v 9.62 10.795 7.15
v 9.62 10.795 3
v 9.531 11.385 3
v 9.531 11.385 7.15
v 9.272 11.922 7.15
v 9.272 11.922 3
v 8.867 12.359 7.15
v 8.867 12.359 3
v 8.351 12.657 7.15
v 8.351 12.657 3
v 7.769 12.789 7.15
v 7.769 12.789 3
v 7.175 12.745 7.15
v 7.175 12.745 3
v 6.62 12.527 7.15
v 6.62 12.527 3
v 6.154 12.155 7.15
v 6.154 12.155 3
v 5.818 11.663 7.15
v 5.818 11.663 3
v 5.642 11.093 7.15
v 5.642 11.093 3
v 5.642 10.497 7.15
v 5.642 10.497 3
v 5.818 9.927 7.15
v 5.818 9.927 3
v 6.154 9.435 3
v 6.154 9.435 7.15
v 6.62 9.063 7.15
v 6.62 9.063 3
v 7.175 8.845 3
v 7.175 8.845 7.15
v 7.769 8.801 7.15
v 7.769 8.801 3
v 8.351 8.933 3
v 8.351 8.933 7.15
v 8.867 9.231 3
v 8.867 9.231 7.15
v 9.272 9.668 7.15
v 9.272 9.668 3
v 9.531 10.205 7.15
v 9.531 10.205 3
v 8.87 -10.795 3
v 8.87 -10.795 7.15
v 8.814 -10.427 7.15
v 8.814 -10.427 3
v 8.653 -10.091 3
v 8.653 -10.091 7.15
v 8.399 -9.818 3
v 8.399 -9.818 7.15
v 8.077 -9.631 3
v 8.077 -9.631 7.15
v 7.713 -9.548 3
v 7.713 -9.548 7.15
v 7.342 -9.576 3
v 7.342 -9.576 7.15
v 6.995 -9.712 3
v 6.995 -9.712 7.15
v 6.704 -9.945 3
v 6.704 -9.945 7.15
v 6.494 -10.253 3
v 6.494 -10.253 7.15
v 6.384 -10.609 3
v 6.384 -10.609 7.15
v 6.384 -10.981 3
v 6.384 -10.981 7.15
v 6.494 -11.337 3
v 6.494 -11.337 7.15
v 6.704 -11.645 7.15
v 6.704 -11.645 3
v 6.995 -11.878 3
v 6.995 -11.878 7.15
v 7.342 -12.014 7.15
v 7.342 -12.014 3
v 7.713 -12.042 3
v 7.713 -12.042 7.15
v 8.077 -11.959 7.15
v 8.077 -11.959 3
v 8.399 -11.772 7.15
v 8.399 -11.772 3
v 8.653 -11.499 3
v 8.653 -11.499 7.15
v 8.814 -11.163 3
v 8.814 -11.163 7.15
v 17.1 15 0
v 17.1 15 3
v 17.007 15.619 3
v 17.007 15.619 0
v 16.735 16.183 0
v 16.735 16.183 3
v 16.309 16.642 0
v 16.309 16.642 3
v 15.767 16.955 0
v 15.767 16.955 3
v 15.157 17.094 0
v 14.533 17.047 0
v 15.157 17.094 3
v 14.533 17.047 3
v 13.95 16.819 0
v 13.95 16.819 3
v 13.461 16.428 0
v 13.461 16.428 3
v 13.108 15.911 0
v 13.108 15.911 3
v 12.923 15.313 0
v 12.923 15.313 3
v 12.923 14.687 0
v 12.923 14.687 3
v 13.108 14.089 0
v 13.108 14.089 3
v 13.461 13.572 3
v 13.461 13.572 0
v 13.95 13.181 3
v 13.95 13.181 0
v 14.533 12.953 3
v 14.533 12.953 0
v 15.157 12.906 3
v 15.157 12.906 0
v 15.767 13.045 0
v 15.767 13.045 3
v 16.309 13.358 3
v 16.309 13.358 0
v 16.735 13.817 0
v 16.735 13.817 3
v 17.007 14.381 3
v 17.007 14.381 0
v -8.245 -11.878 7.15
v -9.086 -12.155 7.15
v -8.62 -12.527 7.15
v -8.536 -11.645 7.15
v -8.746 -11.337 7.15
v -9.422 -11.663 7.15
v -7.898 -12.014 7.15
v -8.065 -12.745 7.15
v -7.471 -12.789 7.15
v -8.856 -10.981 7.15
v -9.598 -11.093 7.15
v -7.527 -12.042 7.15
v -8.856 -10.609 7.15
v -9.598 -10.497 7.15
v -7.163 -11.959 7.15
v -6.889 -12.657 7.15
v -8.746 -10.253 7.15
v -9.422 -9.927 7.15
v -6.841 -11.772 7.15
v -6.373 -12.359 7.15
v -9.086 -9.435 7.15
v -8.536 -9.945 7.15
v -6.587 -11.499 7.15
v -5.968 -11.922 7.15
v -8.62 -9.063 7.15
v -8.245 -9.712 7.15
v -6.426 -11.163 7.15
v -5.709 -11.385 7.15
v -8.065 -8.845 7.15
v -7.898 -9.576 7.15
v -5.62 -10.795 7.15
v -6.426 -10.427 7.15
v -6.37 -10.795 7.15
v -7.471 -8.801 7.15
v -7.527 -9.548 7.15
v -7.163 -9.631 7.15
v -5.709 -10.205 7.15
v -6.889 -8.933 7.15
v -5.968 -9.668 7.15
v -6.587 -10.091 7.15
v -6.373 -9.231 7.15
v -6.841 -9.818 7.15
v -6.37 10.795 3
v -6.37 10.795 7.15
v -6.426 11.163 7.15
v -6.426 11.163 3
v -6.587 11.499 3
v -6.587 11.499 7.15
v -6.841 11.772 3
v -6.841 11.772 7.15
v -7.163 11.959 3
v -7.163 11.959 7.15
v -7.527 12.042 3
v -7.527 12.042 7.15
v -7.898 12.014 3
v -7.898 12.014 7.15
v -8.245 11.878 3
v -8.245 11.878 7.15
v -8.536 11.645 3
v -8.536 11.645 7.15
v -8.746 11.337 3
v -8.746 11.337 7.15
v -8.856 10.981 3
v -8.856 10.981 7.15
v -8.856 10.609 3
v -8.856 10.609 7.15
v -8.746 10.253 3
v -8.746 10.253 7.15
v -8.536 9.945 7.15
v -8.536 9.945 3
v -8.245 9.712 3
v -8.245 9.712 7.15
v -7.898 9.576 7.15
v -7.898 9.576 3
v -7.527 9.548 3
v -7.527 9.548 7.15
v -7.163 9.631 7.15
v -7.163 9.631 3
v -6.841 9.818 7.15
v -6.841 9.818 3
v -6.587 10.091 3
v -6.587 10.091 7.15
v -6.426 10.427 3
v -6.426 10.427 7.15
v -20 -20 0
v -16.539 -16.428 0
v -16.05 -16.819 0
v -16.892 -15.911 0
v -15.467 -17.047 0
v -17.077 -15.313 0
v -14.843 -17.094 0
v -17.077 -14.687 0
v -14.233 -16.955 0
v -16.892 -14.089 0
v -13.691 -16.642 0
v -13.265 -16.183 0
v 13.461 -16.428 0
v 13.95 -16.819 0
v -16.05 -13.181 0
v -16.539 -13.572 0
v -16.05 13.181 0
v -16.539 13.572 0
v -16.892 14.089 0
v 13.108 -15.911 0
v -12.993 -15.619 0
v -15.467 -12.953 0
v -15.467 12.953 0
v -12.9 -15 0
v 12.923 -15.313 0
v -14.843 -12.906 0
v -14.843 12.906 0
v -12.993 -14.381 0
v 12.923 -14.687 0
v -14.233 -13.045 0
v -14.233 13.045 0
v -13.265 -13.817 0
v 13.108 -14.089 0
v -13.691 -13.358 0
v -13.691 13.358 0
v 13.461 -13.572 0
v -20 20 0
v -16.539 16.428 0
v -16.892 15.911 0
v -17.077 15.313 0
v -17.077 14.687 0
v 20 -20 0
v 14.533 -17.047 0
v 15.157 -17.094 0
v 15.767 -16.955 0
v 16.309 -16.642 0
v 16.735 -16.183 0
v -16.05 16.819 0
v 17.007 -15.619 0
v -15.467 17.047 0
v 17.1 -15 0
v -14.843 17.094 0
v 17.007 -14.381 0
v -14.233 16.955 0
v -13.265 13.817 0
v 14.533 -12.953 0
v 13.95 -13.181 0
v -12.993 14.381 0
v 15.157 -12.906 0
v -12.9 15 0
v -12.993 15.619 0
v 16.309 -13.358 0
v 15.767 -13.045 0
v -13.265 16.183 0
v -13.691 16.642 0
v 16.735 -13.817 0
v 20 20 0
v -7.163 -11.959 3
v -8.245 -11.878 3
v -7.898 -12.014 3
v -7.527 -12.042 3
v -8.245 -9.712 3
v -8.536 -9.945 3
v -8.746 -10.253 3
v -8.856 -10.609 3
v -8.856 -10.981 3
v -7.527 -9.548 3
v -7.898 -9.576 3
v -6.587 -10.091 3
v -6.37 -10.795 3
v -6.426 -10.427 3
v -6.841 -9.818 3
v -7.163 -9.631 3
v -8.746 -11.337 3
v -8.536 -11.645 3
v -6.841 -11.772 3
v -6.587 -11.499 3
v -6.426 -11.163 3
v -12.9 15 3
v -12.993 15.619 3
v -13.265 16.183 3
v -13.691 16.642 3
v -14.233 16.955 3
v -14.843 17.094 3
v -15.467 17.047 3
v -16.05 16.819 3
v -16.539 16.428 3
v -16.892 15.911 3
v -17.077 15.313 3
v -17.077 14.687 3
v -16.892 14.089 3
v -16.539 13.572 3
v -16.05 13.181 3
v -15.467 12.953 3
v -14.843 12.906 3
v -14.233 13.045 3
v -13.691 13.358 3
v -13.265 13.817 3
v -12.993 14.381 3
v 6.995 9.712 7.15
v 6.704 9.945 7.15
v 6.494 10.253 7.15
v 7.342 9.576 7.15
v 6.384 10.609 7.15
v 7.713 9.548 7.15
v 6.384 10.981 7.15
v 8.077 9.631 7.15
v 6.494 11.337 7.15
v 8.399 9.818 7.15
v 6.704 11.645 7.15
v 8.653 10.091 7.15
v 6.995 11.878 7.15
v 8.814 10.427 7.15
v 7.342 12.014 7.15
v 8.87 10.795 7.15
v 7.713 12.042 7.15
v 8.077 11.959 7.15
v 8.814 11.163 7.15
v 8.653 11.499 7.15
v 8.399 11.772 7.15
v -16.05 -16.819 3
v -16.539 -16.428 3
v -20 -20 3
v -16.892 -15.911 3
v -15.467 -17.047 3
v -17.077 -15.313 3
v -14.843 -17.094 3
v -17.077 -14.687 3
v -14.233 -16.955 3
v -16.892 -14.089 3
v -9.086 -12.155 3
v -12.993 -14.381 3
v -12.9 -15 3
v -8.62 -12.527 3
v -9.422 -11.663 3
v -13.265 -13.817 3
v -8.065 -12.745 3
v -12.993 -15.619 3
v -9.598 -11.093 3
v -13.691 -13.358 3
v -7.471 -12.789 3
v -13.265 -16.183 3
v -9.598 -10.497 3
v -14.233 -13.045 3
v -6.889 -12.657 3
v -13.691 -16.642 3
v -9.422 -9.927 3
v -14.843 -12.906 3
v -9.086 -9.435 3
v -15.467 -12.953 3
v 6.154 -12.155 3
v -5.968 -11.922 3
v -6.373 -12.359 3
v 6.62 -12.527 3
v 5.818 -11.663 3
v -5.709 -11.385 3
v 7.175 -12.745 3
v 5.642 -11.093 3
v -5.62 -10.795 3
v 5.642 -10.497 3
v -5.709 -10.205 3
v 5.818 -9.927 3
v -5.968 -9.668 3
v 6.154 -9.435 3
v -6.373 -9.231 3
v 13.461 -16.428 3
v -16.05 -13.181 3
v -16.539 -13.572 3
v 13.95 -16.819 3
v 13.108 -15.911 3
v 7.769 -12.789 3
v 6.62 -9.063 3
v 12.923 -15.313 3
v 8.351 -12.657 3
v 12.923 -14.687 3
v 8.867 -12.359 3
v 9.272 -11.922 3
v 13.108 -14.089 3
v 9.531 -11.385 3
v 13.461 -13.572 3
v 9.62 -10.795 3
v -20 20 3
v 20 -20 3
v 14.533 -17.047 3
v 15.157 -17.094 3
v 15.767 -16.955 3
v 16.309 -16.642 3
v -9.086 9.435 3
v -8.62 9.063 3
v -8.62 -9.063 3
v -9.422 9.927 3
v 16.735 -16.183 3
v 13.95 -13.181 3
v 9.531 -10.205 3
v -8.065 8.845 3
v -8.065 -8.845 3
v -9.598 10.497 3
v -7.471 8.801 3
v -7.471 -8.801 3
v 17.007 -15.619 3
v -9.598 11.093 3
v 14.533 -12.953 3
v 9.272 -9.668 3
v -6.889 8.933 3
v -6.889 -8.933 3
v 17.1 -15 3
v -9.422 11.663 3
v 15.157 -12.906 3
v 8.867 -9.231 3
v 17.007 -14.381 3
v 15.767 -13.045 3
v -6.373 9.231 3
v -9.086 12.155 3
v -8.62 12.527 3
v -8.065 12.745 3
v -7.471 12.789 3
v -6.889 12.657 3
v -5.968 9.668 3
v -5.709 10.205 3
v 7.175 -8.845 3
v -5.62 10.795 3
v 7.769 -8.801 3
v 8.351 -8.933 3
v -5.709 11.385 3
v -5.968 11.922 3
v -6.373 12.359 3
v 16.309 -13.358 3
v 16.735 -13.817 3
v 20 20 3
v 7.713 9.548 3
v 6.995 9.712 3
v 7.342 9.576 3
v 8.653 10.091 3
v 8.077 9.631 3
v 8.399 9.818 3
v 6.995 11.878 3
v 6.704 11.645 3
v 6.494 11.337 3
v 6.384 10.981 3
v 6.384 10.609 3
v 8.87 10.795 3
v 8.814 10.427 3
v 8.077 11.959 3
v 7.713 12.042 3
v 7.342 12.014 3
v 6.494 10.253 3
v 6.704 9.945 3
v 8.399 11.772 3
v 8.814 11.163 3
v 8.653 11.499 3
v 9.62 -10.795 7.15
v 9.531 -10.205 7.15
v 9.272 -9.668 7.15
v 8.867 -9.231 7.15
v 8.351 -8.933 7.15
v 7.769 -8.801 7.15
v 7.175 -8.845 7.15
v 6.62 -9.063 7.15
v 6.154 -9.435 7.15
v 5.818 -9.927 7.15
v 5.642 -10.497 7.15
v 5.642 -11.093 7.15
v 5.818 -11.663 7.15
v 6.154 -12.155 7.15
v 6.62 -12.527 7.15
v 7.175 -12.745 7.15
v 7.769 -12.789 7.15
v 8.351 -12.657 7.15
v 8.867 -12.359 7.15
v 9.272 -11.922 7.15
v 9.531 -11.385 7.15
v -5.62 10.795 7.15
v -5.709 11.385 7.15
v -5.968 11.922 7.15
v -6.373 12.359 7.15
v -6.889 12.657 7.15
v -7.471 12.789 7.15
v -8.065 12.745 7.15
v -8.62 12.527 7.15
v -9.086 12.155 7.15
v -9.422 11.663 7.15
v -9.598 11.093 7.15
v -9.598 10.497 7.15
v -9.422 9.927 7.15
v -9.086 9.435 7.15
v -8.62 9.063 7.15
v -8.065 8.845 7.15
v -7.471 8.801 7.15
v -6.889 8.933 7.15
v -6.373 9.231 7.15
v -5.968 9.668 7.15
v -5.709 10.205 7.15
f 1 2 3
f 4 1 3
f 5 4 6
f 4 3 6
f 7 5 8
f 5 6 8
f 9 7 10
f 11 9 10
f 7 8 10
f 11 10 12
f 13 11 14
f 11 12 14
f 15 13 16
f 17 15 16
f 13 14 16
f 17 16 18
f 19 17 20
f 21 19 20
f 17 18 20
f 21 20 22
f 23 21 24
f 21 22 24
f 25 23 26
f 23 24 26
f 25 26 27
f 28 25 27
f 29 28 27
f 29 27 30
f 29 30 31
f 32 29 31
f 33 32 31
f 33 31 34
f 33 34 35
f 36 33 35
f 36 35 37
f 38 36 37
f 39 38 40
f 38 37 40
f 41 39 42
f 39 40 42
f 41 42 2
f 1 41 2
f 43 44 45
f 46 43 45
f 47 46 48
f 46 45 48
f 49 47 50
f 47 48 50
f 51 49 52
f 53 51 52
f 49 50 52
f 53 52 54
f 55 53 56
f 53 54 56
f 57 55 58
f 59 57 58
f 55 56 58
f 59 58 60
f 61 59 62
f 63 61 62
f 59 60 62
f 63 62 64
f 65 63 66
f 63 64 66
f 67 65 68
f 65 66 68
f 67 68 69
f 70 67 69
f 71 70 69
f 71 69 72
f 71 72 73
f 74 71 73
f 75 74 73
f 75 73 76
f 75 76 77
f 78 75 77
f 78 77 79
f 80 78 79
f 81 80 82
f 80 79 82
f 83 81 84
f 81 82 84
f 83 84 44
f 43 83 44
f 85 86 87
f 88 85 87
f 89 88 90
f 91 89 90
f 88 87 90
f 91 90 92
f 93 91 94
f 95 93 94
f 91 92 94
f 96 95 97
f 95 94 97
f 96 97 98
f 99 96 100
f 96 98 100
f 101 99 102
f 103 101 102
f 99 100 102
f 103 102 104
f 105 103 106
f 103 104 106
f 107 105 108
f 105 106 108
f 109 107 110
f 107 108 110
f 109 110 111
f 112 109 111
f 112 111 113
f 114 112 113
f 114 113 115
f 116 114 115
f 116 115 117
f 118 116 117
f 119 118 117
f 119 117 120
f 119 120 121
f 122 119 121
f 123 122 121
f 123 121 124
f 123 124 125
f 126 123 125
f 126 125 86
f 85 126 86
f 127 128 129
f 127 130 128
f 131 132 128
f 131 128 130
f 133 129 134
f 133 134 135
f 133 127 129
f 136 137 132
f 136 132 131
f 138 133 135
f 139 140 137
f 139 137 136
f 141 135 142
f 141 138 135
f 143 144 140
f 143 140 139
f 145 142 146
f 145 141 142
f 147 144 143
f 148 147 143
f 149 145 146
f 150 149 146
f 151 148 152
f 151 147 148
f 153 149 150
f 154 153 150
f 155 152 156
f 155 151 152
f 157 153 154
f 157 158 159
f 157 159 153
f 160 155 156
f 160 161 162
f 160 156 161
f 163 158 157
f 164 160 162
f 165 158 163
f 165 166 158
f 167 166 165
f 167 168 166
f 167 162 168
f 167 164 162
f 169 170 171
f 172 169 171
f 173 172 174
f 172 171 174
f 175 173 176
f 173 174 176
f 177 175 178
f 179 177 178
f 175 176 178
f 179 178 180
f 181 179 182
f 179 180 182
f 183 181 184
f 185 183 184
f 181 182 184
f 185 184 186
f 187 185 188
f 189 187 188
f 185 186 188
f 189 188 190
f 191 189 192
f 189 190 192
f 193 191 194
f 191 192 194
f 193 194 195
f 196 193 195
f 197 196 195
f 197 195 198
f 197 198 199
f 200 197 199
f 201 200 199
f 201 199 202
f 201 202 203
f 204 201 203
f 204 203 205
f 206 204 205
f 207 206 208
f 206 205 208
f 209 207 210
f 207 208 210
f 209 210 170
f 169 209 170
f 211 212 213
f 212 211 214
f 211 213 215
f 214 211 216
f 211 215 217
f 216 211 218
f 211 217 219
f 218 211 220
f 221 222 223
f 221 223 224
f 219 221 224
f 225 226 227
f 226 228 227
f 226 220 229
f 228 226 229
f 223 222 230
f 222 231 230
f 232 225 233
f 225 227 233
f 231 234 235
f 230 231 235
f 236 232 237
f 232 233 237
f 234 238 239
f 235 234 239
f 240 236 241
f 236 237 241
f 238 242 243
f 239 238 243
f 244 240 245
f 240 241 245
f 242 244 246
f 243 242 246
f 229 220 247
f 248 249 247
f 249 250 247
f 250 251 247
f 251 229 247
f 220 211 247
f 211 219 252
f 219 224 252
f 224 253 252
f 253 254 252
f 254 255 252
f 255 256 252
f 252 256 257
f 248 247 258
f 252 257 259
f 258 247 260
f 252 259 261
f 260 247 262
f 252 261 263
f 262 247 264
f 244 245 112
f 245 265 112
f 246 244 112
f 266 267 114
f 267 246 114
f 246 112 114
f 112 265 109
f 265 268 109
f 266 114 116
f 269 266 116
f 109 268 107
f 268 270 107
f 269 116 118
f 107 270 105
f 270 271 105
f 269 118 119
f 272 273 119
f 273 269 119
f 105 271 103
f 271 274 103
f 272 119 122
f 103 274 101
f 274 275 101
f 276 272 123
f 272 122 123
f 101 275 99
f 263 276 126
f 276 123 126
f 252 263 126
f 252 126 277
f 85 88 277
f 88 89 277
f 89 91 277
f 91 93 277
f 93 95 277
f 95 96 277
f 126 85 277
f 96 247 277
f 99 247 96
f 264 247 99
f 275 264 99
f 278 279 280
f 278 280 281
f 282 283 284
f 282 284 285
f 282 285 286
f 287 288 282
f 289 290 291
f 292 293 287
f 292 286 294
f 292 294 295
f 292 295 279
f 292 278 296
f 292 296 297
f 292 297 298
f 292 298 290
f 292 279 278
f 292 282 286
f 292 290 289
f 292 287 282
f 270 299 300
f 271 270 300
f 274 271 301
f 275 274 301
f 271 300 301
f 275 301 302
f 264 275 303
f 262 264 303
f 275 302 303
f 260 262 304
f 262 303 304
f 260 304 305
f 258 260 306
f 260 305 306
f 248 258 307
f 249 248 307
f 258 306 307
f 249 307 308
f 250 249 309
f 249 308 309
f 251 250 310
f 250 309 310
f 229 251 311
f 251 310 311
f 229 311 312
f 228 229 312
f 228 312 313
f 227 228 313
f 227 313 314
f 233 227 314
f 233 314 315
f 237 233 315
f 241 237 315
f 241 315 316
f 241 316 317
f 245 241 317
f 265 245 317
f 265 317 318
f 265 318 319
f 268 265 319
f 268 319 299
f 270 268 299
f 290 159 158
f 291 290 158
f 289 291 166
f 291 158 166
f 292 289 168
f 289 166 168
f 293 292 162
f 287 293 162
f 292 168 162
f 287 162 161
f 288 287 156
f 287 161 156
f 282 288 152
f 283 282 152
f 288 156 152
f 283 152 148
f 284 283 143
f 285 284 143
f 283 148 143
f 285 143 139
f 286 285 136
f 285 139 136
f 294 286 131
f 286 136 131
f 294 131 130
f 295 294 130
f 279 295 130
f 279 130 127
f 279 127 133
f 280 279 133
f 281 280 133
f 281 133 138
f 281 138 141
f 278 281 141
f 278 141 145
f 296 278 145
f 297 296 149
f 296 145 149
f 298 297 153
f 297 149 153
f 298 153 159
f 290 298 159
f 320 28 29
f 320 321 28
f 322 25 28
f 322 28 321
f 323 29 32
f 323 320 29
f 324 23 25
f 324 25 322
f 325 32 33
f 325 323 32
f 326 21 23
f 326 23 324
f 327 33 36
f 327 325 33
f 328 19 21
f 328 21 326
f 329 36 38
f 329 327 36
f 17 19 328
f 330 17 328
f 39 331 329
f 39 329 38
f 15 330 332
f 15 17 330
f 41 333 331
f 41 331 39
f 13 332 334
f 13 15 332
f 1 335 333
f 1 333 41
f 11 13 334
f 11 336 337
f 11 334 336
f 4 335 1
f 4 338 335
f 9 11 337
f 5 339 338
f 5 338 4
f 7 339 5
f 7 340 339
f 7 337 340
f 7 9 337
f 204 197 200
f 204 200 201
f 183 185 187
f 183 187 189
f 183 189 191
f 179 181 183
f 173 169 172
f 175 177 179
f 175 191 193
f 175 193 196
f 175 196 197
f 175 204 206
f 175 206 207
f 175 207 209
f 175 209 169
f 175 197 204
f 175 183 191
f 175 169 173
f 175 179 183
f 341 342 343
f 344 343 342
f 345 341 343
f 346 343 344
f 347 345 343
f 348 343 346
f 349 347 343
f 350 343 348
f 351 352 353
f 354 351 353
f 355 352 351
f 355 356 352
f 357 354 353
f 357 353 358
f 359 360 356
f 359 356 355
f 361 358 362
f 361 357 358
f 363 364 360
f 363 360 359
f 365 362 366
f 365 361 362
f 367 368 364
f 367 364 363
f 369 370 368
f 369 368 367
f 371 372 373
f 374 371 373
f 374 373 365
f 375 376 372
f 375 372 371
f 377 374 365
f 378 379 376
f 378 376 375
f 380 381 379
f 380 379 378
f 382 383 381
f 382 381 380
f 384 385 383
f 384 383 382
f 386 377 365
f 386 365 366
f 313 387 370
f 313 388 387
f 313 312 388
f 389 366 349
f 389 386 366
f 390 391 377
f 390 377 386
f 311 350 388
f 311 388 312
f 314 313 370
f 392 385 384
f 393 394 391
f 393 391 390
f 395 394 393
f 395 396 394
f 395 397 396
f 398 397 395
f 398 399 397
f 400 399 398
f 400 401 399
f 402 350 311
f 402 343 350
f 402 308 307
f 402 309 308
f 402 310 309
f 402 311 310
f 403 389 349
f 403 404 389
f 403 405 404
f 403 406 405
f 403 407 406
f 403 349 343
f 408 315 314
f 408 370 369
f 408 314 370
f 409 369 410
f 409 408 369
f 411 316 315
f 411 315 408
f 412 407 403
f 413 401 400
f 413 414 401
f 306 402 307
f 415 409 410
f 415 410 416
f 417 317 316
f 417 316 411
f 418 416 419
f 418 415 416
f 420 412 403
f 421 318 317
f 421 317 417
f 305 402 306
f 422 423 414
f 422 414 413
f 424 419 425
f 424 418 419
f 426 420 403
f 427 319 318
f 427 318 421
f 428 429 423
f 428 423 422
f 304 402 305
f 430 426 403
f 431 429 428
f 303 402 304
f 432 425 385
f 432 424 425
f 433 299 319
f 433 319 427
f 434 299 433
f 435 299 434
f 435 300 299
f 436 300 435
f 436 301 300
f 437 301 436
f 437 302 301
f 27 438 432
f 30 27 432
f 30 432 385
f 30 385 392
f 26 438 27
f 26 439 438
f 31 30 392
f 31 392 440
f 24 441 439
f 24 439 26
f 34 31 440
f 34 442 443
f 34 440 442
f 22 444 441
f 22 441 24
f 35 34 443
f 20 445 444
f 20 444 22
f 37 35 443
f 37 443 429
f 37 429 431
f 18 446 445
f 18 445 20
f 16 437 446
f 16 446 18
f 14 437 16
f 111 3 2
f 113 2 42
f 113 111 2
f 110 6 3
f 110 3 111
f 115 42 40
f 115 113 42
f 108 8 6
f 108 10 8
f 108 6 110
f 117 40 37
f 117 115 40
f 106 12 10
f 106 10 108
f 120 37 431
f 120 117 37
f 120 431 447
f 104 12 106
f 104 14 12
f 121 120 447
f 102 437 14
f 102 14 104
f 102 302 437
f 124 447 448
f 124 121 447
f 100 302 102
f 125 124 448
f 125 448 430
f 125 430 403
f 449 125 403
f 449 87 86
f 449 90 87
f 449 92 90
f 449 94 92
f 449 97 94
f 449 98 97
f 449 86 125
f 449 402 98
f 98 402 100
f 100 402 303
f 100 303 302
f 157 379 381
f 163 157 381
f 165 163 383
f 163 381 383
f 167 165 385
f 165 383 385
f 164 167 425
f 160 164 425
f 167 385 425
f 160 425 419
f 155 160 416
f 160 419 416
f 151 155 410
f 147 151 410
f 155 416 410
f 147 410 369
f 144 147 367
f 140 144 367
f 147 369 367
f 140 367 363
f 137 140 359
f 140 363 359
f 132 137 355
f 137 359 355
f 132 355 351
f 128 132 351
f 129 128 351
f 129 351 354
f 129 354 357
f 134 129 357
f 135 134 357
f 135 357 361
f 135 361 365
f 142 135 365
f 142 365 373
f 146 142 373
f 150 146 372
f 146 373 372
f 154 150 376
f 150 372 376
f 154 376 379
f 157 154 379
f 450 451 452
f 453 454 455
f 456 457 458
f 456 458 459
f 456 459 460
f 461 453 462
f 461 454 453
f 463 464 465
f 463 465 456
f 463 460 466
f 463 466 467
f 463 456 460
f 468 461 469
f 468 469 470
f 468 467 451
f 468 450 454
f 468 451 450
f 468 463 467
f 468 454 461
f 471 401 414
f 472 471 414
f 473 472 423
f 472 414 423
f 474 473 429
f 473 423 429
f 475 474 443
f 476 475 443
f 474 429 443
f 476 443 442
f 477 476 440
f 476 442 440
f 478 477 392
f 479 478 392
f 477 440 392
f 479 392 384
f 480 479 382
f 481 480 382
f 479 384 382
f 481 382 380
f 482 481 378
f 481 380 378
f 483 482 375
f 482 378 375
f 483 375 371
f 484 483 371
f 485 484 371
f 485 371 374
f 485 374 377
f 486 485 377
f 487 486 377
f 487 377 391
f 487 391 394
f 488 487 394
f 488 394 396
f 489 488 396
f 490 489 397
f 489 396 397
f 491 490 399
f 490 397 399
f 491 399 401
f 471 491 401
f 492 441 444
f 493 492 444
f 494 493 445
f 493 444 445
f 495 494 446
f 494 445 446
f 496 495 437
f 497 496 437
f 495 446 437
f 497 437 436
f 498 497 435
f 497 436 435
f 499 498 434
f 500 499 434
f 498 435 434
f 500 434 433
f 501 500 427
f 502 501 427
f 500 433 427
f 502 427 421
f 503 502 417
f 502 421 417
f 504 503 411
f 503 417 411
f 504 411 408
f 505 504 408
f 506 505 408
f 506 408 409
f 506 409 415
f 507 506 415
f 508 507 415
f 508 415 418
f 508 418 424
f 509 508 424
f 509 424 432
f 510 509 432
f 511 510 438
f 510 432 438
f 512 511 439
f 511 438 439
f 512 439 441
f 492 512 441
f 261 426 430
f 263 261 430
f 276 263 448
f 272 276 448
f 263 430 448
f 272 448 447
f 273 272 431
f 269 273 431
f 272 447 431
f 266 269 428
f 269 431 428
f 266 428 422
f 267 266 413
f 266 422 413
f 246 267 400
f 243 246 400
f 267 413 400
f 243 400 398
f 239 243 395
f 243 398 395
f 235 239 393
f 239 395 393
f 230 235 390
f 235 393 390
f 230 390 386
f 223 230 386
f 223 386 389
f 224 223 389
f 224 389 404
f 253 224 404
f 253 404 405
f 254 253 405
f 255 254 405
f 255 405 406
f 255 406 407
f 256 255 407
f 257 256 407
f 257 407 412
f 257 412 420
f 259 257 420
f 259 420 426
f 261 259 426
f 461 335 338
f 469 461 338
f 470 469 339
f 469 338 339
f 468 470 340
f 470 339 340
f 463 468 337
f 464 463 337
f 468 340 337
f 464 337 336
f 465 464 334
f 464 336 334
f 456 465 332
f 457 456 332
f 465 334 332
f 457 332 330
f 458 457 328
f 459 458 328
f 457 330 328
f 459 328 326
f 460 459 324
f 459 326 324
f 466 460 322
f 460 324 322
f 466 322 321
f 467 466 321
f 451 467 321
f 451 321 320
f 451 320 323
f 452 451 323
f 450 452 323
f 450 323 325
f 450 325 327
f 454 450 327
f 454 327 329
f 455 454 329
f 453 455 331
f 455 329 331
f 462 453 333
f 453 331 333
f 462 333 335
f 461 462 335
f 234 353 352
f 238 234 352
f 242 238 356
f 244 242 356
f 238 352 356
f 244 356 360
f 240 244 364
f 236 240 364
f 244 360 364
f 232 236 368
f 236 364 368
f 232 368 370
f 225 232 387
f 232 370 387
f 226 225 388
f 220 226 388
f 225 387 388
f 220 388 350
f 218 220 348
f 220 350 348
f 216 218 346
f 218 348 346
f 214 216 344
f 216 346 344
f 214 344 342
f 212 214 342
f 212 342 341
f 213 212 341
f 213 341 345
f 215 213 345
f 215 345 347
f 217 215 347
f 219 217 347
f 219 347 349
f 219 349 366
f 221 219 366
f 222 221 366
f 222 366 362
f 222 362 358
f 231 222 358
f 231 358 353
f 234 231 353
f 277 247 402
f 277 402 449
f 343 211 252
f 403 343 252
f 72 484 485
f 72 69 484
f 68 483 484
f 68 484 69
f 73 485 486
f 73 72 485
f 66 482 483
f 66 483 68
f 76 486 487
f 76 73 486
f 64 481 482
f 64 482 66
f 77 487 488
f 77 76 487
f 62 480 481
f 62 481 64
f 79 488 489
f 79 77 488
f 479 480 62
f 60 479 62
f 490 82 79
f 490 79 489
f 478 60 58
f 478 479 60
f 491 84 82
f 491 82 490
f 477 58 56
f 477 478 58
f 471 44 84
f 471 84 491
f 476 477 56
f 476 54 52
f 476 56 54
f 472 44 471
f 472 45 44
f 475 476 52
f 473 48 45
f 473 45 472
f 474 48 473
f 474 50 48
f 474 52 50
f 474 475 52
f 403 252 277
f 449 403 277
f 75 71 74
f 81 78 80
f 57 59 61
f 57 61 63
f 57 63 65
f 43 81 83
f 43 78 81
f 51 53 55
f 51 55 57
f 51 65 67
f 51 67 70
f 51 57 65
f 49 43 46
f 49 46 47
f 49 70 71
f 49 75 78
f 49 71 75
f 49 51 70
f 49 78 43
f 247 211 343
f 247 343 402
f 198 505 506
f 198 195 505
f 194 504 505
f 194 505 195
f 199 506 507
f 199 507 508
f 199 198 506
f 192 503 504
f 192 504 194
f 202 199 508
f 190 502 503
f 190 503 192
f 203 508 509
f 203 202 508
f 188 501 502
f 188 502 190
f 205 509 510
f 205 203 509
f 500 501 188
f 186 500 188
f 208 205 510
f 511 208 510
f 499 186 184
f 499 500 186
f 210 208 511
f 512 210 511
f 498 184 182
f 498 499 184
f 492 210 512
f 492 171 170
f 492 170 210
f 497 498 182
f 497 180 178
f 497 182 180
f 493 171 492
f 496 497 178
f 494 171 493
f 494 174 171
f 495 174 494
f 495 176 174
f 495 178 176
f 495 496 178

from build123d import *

# Parameters (mm, degrees)
SKETCH_1_W          = 40
SKETCH_1_H          = 40
EXTRUDE_1_DEPTH     = 3
SKETCH_2_R          = 2
EXTRUDE_2_DEPTH     = 4.15
SKETCH_4_R          = 2.1
CUT_EXTRUDE_1_DEPTH = 4
SKETCH_3_R          = 1.25
CUT_EXTRUDE_2_DEPTH = 4.15


with BuildPart() as part:
    # 草圖1 → 填料-伸長1 (new body)
    with BuildSketch(Plane.XY):
        Rectangle(SKETCH_1_W, SKETCH_1_H)
    extrude(amount=EXTRUDE_1_DEPTH)

    # 草圖2 → 填料-伸長2 (add)
    with BuildSketch(Plane.XY.offset(3)):
        with Locations((-7.62, 10.795)):
            Circle(SKETCH_2_R)
        with Locations((-7.62, -10.795)):
            Circle(SKETCH_2_R)
        with Locations((7.62, -10.795)):
            Circle(SKETCH_2_R)
        with Locations((7.62, 10.795)):
            Circle(SKETCH_2_R)
    extrude(amount=EXTRUDE_2_DEPTH)

    # 草圖4 → 除料-伸長1 (cut, through all)
    with BuildSketch(Plane.XY.offset(3)):
        with Locations((-15, 15)):
            Circle(SKETCH_4_R)
        with Locations((-15, -15)):
            Circle(SKETCH_4_R)
        with Locations((15, -15)):
            Circle(SKETCH_4_R)
        with Locations((15, 15)):
            Circle(SKETCH_4_R)
    extrude(amount=-CUT_EXTRUDE_1_DEPTH, mode=Mode.SUBTRACT)

    # 草圖3 → 除料-伸長2 (cut)
    with BuildSketch(Plane.XY.offset(7.15)):
        with Locations((-7.62, 10.795)):
            Circle(SKETCH_3_R)
        with Locations((-7.62, -10.795)):
            Circle(SKETCH_3_R)
        with Locations((7.62, -10.795)):
            Circle(SKETCH_3_R)
        with Locations((7.62, 10.795)):
            Circle(SKETCH_3_R)
    extrude(amount=-CUT_EXTRUDE_2_DEPTH, mode=Mode.SUBTRACT)


solid = part.part
